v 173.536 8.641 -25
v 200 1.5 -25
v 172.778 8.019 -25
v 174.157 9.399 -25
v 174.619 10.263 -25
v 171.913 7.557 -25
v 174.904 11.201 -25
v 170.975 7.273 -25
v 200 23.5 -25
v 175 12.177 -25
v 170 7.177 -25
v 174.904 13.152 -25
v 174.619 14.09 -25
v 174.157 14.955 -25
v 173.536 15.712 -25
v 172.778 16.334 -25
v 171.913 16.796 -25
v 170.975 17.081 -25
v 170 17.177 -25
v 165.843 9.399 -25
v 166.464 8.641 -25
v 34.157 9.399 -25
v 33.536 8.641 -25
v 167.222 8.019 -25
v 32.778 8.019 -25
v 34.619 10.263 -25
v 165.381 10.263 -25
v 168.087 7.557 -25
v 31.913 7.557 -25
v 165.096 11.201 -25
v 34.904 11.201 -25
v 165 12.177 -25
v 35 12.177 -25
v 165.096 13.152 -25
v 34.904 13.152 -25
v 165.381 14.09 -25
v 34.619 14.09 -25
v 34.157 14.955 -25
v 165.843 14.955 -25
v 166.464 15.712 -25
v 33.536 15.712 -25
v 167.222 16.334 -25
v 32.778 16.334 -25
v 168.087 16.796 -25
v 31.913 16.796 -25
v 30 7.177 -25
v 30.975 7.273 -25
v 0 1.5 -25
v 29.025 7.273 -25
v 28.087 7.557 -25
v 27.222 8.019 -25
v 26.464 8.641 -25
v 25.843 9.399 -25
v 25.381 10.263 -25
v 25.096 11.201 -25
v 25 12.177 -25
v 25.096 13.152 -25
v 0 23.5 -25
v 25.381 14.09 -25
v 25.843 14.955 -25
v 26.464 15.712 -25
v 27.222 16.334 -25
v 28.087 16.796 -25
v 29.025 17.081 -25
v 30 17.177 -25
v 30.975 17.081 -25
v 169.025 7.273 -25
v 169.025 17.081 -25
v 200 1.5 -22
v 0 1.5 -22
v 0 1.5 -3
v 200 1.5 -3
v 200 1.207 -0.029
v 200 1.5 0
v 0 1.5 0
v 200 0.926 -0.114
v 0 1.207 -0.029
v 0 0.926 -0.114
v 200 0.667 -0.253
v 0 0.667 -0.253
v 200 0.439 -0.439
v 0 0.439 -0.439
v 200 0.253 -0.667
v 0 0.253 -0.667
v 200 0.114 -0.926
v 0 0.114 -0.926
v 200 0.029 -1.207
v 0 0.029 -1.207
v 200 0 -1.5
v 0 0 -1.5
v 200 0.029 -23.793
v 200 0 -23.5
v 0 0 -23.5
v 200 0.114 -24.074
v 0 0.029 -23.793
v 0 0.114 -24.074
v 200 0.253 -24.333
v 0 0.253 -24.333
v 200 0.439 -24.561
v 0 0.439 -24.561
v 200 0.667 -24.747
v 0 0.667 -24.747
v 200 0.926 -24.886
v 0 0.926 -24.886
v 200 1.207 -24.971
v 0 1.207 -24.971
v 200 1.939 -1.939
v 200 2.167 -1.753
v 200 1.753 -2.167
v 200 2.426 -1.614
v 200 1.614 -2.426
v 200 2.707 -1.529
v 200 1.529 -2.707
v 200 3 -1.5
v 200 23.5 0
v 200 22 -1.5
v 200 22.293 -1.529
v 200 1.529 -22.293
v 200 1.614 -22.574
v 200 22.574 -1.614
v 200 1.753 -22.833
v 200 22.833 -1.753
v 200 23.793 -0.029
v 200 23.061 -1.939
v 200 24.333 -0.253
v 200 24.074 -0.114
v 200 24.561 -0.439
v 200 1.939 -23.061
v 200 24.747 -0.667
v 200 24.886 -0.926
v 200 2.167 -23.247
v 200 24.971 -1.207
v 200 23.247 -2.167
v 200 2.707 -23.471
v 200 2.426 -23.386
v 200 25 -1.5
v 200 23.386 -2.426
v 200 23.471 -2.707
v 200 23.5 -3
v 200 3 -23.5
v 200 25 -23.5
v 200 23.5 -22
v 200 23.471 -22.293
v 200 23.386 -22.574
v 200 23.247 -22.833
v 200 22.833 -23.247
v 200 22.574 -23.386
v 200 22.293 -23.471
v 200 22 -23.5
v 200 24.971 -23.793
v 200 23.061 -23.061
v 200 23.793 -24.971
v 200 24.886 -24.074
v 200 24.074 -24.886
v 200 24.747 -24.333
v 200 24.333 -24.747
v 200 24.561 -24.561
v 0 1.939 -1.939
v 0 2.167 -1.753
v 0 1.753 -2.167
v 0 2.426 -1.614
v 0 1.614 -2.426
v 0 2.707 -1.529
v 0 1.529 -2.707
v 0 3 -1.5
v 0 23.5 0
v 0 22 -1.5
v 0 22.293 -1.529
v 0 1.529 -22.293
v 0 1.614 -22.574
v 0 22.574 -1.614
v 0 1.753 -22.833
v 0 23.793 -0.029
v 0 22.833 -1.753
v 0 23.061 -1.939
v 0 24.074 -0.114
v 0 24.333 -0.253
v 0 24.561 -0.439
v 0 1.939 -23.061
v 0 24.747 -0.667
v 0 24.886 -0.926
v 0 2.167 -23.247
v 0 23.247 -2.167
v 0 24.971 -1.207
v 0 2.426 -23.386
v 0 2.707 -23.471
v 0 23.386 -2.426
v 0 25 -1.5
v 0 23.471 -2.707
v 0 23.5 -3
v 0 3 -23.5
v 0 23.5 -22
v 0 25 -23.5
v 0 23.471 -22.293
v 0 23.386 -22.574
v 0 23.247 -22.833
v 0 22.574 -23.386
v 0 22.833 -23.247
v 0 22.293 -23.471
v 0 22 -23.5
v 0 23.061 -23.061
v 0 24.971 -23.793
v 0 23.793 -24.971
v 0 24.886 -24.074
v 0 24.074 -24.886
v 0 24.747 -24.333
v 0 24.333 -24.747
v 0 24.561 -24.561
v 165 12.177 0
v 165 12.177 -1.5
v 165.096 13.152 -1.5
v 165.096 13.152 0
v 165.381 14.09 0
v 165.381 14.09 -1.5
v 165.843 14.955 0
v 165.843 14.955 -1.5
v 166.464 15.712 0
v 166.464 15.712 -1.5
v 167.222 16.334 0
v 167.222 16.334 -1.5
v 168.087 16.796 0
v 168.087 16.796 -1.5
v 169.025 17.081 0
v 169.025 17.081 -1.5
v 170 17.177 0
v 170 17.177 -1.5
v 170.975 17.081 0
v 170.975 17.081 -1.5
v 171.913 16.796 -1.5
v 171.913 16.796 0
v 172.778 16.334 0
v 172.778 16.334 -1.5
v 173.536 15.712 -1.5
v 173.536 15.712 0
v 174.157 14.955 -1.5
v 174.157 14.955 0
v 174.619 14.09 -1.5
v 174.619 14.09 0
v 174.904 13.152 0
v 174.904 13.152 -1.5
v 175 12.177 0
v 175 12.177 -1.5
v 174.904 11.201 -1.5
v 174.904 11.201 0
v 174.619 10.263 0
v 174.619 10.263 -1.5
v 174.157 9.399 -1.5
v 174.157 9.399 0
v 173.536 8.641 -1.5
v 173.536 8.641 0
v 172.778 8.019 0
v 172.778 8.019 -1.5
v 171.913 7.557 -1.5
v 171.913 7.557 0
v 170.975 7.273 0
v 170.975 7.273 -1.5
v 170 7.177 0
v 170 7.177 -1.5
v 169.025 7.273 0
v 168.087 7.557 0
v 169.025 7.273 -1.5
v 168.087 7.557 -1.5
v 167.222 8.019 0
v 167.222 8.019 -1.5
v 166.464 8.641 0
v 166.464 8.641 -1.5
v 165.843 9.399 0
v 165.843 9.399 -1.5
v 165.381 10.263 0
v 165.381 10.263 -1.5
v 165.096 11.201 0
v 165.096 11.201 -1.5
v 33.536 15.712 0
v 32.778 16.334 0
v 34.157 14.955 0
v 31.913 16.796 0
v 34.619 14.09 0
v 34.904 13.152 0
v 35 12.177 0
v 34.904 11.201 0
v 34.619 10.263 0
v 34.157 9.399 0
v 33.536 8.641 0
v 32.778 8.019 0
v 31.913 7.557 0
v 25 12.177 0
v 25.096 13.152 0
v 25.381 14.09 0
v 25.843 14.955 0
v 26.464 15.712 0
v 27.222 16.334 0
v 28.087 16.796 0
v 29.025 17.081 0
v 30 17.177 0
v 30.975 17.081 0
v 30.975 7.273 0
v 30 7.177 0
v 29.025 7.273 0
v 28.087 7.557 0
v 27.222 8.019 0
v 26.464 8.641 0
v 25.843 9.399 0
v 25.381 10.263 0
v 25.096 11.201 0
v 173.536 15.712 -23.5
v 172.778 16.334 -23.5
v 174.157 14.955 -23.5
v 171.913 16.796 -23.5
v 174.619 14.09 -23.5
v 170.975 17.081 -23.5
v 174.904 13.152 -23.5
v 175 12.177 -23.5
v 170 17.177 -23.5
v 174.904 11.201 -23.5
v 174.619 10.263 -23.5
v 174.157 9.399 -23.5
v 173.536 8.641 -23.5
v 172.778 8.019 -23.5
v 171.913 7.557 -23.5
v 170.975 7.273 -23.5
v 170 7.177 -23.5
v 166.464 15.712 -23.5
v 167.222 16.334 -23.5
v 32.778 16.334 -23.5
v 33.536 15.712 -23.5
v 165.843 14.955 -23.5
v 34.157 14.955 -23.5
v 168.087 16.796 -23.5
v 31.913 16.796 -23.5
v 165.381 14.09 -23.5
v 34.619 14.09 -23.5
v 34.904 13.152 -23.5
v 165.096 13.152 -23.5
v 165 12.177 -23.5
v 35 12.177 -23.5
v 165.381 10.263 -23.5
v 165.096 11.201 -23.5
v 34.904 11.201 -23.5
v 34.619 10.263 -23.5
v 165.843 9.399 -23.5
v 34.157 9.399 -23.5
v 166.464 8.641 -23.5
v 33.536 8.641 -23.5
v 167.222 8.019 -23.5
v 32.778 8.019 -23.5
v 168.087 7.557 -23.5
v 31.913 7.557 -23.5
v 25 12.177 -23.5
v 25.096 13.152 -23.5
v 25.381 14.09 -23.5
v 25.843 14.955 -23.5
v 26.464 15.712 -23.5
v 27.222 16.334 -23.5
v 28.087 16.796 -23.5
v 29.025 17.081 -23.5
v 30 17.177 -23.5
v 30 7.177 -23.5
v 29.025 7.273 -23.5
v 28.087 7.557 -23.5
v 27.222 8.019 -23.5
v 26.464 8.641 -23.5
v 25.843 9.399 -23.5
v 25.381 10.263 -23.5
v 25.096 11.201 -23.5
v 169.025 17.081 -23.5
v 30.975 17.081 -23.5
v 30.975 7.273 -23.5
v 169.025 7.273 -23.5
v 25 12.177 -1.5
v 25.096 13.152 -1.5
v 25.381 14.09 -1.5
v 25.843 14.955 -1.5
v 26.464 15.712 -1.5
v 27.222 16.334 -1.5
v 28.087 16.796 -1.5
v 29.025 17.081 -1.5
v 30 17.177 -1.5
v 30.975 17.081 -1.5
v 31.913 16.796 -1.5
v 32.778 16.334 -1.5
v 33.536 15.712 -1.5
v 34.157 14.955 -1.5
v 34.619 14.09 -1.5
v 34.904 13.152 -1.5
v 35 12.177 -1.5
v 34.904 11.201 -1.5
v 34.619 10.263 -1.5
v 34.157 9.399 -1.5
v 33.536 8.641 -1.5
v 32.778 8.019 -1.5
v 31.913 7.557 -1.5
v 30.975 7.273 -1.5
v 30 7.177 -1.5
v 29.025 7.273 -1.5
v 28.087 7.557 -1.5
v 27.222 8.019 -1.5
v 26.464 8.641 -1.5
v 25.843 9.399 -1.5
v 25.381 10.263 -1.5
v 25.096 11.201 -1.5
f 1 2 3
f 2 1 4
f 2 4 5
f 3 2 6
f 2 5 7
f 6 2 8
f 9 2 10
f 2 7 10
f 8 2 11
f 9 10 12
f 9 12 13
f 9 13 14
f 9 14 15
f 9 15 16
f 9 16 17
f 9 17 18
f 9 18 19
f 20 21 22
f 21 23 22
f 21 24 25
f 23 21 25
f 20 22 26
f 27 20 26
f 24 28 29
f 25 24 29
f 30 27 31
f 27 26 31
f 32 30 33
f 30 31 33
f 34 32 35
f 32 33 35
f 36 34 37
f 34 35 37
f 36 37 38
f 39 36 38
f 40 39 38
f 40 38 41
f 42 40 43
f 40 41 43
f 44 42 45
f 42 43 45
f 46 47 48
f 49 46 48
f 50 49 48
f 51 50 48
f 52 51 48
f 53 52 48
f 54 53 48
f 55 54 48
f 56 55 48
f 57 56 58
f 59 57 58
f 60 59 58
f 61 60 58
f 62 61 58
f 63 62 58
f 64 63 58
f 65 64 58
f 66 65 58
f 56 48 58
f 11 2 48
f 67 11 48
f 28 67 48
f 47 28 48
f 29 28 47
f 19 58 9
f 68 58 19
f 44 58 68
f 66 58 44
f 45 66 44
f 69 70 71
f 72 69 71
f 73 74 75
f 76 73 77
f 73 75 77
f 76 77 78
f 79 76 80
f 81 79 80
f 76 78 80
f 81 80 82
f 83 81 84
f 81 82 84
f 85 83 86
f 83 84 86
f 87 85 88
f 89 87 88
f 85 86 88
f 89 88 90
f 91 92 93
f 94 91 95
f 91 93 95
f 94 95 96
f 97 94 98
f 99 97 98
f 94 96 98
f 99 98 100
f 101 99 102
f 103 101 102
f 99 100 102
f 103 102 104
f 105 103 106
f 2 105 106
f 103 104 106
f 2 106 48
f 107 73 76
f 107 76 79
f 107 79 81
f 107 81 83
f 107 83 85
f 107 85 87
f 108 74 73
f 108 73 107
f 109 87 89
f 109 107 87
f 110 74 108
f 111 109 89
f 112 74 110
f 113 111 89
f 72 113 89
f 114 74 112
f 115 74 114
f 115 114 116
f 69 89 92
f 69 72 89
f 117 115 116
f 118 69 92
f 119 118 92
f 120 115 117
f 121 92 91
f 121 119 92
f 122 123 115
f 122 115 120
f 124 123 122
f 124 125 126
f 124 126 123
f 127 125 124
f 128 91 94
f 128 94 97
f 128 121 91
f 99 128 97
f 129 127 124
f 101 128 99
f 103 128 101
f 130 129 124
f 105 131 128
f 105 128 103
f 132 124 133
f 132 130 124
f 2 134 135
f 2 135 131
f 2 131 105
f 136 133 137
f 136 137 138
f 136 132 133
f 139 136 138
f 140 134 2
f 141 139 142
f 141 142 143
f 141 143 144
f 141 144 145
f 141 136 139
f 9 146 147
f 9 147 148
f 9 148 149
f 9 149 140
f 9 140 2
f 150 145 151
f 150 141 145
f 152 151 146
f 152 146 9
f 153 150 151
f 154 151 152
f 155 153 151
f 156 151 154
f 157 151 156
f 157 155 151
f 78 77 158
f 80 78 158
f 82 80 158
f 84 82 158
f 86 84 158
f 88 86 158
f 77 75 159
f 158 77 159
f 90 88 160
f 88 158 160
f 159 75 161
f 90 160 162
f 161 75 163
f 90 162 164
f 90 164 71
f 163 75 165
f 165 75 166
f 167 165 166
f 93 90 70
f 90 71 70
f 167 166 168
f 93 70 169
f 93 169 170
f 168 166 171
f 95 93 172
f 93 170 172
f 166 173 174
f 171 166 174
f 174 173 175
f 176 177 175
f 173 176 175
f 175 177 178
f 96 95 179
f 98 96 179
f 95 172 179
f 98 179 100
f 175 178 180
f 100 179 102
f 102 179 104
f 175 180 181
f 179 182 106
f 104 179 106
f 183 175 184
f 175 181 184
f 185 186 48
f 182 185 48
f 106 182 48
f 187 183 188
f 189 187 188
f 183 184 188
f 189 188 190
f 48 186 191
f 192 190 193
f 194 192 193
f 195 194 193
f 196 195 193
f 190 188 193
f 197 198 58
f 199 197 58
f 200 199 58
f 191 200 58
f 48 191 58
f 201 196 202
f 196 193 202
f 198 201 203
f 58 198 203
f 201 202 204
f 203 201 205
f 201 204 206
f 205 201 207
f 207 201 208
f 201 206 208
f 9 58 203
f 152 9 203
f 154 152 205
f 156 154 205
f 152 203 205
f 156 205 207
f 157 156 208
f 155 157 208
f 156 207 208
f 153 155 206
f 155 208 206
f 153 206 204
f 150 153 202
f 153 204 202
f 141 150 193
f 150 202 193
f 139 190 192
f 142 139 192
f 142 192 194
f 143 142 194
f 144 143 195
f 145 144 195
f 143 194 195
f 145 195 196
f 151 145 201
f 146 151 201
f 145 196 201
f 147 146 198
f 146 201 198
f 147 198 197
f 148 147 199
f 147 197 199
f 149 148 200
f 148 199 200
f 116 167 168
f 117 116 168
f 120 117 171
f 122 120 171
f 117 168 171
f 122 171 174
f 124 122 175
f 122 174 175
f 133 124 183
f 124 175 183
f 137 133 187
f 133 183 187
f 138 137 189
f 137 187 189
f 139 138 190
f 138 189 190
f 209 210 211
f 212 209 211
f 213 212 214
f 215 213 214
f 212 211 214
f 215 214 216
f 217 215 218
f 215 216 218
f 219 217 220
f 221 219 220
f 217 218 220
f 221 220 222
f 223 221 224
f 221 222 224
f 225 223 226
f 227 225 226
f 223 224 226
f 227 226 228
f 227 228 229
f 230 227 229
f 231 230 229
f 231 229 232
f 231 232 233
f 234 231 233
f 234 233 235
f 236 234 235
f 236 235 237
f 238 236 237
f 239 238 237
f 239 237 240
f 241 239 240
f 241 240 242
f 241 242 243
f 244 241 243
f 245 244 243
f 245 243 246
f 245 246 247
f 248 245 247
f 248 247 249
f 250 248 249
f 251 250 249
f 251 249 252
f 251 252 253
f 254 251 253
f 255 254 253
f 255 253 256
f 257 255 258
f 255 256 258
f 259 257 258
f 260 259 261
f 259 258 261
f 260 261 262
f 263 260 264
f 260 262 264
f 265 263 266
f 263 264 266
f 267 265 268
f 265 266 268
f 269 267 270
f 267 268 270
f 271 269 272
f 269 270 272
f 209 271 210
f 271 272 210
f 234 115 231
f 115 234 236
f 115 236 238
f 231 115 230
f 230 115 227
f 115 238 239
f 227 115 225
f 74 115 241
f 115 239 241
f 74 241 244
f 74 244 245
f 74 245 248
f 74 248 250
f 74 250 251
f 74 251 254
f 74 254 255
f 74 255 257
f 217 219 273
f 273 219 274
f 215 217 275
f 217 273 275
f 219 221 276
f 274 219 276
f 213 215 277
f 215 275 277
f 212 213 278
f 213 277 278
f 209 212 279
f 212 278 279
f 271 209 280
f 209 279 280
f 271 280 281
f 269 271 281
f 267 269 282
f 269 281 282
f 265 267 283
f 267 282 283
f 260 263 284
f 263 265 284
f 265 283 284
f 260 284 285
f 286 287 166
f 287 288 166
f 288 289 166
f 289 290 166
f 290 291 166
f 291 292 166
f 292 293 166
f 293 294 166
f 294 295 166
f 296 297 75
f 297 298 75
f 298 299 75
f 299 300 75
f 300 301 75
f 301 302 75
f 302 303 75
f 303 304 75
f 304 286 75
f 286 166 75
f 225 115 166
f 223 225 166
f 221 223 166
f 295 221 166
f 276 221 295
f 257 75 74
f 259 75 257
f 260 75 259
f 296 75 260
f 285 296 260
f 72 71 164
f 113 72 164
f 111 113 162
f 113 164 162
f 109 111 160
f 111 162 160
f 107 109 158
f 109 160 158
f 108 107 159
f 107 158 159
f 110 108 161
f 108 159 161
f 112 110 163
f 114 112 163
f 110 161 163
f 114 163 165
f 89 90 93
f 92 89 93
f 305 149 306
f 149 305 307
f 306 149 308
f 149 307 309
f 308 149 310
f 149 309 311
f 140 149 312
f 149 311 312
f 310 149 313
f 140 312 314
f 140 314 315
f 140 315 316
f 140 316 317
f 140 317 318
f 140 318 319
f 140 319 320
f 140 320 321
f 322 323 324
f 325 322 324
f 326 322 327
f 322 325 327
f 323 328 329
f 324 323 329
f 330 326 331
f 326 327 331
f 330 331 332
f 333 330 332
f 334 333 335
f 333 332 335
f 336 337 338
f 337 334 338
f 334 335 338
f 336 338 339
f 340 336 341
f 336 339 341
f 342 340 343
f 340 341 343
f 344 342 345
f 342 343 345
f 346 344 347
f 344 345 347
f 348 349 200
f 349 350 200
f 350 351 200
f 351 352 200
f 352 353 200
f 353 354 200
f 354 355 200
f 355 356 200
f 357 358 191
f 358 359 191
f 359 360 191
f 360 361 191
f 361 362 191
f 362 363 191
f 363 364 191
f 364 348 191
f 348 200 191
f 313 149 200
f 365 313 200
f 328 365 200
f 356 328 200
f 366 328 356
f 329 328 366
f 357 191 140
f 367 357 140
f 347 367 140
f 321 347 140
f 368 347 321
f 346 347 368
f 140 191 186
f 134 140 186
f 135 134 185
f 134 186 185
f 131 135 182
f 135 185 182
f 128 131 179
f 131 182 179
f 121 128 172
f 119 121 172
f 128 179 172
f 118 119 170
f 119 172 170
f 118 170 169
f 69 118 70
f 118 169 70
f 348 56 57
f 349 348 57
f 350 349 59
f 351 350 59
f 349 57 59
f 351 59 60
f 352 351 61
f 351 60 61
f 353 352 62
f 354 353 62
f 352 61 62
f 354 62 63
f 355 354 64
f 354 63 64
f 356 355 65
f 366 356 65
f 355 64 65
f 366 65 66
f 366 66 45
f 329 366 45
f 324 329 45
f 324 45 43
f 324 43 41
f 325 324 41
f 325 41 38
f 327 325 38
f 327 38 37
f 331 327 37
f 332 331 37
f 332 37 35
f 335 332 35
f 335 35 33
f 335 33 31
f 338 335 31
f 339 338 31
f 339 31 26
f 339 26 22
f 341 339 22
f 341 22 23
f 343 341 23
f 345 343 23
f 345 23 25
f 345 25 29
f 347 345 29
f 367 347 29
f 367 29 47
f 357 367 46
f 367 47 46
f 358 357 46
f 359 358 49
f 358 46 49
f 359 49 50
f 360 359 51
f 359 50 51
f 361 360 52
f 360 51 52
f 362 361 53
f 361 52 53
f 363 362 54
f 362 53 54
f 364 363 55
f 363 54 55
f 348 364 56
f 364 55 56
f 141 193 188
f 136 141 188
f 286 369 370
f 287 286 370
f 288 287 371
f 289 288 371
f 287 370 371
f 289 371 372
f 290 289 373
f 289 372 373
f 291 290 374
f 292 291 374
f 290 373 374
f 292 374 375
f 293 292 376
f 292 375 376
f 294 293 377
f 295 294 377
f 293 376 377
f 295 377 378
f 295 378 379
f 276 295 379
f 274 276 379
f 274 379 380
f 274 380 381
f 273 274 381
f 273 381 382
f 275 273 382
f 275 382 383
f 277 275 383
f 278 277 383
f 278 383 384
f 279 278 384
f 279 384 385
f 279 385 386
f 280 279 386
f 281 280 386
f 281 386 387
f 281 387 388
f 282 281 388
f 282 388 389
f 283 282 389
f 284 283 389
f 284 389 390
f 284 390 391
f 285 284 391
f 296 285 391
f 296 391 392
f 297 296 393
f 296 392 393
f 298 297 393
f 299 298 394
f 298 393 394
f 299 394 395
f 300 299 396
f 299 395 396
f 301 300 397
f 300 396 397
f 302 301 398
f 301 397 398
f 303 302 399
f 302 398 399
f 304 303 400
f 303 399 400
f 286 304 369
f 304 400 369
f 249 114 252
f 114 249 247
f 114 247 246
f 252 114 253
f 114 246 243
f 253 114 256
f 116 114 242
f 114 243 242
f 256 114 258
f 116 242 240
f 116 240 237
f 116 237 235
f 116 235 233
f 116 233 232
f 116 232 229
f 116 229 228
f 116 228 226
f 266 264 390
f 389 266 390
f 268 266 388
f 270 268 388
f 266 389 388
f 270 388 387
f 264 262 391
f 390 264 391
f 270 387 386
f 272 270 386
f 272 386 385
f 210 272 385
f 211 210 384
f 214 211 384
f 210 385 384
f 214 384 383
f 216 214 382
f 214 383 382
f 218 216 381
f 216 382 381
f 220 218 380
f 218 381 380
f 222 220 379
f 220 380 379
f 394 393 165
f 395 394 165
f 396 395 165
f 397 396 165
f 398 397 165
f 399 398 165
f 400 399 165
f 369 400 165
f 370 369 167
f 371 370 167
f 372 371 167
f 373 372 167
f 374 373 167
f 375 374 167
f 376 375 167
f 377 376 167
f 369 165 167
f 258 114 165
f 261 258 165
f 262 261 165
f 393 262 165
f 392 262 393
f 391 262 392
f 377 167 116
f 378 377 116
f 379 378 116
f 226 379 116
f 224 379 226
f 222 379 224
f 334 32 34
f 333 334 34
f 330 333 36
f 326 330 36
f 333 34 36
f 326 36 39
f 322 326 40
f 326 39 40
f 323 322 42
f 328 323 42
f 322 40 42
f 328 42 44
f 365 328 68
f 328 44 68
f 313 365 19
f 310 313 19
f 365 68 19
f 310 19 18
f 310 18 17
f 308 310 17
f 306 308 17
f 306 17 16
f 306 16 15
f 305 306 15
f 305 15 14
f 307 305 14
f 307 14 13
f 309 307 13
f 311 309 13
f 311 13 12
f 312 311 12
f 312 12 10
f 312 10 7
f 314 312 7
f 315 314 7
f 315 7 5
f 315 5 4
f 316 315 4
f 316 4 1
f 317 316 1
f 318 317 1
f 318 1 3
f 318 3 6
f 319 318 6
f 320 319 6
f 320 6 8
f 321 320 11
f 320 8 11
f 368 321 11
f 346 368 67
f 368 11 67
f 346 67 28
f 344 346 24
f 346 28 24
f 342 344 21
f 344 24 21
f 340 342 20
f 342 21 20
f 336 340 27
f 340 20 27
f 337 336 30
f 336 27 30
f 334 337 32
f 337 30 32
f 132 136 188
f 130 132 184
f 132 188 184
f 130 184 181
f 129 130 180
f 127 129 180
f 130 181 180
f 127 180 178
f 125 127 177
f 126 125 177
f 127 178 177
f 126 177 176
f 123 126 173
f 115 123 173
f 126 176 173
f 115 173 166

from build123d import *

# Parameters (mm, degrees)
BOSS_EXTRUDE1_DEPTH = 200
SKETCH3_R           = 5
CUT_EXTRUDE1_DEPTH  = 204.100960116


with BuildPart() as part:
    # Sketch1 → Boss-Extrude1 (new body)
    with BuildSketch(Plane(origin=(0, 0, 0), x_dir=(0, 0, -1), z_dir=(1, 0, 0))):
        with BuildLine():
            Line((1.5, 0), (23.5, 0))
            ThreePointArc((23.5, 0), (24.560660172, 0.439339828), (25, 1.5))
            Line((25, 1.5), (25, 23.5))
            ThreePointArc((25, 23.5), (24.560660172, 24.560660172), (23.5, 25))
            Line((23.5, 25), (1.5, 25))
            ThreePointArc((1.5, 25), (0.439339828, 24.560660172), (0, 23.5))
            Line((0, 23.5), (0, 1.5))
            ThreePointArc((0, 1.5), (0.439339828, 0.439339828), (1.5, 0))
        make_face()
        with BuildLine():
            Line((3, 23.5), (22, 23.5))
            ThreePointArc((22, 23.5), (23.060660172, 23.060660172), (23.5, 22))
            Line((23.5, 22), (23.5, 3))
            ThreePointArc((23.5, 3), (23.060660172, 1.939339828), (22, 1.5))
            Line((22, 1.5), (3, 1.5))
            ThreePointArc((3, 1.5), (1.939339828, 1.939339828), (1.5, 3))
            Line((1.5, 3), (1.5, 22))
            ThreePointArc((1.5, 22), (1.939339828, 23.060660172), (3, 23.5))
        make_face(mode=Mode.SUBTRACT)
    extrude(amount=BOSS_EXTRUDE1_DEPTH)

    # Sketch3 → Cut-Extrude1 (cut, through all)
    with BuildSketch(Plane(origin=(0, 0, -25), x_dir=(-1, 0, 0), z_dir=(0, 0, -1))):
        with Locations((-170, 12.176713796)):
            Circle(SKETCH3_R)
        with Locations((-30, 12.176713796)):
            Circle(SKETCH3_R)
    extrude(amount=-CUT_EXTRUDE1_DEPTH, mode=Mode.SUBTRACT)


solid = part.part
